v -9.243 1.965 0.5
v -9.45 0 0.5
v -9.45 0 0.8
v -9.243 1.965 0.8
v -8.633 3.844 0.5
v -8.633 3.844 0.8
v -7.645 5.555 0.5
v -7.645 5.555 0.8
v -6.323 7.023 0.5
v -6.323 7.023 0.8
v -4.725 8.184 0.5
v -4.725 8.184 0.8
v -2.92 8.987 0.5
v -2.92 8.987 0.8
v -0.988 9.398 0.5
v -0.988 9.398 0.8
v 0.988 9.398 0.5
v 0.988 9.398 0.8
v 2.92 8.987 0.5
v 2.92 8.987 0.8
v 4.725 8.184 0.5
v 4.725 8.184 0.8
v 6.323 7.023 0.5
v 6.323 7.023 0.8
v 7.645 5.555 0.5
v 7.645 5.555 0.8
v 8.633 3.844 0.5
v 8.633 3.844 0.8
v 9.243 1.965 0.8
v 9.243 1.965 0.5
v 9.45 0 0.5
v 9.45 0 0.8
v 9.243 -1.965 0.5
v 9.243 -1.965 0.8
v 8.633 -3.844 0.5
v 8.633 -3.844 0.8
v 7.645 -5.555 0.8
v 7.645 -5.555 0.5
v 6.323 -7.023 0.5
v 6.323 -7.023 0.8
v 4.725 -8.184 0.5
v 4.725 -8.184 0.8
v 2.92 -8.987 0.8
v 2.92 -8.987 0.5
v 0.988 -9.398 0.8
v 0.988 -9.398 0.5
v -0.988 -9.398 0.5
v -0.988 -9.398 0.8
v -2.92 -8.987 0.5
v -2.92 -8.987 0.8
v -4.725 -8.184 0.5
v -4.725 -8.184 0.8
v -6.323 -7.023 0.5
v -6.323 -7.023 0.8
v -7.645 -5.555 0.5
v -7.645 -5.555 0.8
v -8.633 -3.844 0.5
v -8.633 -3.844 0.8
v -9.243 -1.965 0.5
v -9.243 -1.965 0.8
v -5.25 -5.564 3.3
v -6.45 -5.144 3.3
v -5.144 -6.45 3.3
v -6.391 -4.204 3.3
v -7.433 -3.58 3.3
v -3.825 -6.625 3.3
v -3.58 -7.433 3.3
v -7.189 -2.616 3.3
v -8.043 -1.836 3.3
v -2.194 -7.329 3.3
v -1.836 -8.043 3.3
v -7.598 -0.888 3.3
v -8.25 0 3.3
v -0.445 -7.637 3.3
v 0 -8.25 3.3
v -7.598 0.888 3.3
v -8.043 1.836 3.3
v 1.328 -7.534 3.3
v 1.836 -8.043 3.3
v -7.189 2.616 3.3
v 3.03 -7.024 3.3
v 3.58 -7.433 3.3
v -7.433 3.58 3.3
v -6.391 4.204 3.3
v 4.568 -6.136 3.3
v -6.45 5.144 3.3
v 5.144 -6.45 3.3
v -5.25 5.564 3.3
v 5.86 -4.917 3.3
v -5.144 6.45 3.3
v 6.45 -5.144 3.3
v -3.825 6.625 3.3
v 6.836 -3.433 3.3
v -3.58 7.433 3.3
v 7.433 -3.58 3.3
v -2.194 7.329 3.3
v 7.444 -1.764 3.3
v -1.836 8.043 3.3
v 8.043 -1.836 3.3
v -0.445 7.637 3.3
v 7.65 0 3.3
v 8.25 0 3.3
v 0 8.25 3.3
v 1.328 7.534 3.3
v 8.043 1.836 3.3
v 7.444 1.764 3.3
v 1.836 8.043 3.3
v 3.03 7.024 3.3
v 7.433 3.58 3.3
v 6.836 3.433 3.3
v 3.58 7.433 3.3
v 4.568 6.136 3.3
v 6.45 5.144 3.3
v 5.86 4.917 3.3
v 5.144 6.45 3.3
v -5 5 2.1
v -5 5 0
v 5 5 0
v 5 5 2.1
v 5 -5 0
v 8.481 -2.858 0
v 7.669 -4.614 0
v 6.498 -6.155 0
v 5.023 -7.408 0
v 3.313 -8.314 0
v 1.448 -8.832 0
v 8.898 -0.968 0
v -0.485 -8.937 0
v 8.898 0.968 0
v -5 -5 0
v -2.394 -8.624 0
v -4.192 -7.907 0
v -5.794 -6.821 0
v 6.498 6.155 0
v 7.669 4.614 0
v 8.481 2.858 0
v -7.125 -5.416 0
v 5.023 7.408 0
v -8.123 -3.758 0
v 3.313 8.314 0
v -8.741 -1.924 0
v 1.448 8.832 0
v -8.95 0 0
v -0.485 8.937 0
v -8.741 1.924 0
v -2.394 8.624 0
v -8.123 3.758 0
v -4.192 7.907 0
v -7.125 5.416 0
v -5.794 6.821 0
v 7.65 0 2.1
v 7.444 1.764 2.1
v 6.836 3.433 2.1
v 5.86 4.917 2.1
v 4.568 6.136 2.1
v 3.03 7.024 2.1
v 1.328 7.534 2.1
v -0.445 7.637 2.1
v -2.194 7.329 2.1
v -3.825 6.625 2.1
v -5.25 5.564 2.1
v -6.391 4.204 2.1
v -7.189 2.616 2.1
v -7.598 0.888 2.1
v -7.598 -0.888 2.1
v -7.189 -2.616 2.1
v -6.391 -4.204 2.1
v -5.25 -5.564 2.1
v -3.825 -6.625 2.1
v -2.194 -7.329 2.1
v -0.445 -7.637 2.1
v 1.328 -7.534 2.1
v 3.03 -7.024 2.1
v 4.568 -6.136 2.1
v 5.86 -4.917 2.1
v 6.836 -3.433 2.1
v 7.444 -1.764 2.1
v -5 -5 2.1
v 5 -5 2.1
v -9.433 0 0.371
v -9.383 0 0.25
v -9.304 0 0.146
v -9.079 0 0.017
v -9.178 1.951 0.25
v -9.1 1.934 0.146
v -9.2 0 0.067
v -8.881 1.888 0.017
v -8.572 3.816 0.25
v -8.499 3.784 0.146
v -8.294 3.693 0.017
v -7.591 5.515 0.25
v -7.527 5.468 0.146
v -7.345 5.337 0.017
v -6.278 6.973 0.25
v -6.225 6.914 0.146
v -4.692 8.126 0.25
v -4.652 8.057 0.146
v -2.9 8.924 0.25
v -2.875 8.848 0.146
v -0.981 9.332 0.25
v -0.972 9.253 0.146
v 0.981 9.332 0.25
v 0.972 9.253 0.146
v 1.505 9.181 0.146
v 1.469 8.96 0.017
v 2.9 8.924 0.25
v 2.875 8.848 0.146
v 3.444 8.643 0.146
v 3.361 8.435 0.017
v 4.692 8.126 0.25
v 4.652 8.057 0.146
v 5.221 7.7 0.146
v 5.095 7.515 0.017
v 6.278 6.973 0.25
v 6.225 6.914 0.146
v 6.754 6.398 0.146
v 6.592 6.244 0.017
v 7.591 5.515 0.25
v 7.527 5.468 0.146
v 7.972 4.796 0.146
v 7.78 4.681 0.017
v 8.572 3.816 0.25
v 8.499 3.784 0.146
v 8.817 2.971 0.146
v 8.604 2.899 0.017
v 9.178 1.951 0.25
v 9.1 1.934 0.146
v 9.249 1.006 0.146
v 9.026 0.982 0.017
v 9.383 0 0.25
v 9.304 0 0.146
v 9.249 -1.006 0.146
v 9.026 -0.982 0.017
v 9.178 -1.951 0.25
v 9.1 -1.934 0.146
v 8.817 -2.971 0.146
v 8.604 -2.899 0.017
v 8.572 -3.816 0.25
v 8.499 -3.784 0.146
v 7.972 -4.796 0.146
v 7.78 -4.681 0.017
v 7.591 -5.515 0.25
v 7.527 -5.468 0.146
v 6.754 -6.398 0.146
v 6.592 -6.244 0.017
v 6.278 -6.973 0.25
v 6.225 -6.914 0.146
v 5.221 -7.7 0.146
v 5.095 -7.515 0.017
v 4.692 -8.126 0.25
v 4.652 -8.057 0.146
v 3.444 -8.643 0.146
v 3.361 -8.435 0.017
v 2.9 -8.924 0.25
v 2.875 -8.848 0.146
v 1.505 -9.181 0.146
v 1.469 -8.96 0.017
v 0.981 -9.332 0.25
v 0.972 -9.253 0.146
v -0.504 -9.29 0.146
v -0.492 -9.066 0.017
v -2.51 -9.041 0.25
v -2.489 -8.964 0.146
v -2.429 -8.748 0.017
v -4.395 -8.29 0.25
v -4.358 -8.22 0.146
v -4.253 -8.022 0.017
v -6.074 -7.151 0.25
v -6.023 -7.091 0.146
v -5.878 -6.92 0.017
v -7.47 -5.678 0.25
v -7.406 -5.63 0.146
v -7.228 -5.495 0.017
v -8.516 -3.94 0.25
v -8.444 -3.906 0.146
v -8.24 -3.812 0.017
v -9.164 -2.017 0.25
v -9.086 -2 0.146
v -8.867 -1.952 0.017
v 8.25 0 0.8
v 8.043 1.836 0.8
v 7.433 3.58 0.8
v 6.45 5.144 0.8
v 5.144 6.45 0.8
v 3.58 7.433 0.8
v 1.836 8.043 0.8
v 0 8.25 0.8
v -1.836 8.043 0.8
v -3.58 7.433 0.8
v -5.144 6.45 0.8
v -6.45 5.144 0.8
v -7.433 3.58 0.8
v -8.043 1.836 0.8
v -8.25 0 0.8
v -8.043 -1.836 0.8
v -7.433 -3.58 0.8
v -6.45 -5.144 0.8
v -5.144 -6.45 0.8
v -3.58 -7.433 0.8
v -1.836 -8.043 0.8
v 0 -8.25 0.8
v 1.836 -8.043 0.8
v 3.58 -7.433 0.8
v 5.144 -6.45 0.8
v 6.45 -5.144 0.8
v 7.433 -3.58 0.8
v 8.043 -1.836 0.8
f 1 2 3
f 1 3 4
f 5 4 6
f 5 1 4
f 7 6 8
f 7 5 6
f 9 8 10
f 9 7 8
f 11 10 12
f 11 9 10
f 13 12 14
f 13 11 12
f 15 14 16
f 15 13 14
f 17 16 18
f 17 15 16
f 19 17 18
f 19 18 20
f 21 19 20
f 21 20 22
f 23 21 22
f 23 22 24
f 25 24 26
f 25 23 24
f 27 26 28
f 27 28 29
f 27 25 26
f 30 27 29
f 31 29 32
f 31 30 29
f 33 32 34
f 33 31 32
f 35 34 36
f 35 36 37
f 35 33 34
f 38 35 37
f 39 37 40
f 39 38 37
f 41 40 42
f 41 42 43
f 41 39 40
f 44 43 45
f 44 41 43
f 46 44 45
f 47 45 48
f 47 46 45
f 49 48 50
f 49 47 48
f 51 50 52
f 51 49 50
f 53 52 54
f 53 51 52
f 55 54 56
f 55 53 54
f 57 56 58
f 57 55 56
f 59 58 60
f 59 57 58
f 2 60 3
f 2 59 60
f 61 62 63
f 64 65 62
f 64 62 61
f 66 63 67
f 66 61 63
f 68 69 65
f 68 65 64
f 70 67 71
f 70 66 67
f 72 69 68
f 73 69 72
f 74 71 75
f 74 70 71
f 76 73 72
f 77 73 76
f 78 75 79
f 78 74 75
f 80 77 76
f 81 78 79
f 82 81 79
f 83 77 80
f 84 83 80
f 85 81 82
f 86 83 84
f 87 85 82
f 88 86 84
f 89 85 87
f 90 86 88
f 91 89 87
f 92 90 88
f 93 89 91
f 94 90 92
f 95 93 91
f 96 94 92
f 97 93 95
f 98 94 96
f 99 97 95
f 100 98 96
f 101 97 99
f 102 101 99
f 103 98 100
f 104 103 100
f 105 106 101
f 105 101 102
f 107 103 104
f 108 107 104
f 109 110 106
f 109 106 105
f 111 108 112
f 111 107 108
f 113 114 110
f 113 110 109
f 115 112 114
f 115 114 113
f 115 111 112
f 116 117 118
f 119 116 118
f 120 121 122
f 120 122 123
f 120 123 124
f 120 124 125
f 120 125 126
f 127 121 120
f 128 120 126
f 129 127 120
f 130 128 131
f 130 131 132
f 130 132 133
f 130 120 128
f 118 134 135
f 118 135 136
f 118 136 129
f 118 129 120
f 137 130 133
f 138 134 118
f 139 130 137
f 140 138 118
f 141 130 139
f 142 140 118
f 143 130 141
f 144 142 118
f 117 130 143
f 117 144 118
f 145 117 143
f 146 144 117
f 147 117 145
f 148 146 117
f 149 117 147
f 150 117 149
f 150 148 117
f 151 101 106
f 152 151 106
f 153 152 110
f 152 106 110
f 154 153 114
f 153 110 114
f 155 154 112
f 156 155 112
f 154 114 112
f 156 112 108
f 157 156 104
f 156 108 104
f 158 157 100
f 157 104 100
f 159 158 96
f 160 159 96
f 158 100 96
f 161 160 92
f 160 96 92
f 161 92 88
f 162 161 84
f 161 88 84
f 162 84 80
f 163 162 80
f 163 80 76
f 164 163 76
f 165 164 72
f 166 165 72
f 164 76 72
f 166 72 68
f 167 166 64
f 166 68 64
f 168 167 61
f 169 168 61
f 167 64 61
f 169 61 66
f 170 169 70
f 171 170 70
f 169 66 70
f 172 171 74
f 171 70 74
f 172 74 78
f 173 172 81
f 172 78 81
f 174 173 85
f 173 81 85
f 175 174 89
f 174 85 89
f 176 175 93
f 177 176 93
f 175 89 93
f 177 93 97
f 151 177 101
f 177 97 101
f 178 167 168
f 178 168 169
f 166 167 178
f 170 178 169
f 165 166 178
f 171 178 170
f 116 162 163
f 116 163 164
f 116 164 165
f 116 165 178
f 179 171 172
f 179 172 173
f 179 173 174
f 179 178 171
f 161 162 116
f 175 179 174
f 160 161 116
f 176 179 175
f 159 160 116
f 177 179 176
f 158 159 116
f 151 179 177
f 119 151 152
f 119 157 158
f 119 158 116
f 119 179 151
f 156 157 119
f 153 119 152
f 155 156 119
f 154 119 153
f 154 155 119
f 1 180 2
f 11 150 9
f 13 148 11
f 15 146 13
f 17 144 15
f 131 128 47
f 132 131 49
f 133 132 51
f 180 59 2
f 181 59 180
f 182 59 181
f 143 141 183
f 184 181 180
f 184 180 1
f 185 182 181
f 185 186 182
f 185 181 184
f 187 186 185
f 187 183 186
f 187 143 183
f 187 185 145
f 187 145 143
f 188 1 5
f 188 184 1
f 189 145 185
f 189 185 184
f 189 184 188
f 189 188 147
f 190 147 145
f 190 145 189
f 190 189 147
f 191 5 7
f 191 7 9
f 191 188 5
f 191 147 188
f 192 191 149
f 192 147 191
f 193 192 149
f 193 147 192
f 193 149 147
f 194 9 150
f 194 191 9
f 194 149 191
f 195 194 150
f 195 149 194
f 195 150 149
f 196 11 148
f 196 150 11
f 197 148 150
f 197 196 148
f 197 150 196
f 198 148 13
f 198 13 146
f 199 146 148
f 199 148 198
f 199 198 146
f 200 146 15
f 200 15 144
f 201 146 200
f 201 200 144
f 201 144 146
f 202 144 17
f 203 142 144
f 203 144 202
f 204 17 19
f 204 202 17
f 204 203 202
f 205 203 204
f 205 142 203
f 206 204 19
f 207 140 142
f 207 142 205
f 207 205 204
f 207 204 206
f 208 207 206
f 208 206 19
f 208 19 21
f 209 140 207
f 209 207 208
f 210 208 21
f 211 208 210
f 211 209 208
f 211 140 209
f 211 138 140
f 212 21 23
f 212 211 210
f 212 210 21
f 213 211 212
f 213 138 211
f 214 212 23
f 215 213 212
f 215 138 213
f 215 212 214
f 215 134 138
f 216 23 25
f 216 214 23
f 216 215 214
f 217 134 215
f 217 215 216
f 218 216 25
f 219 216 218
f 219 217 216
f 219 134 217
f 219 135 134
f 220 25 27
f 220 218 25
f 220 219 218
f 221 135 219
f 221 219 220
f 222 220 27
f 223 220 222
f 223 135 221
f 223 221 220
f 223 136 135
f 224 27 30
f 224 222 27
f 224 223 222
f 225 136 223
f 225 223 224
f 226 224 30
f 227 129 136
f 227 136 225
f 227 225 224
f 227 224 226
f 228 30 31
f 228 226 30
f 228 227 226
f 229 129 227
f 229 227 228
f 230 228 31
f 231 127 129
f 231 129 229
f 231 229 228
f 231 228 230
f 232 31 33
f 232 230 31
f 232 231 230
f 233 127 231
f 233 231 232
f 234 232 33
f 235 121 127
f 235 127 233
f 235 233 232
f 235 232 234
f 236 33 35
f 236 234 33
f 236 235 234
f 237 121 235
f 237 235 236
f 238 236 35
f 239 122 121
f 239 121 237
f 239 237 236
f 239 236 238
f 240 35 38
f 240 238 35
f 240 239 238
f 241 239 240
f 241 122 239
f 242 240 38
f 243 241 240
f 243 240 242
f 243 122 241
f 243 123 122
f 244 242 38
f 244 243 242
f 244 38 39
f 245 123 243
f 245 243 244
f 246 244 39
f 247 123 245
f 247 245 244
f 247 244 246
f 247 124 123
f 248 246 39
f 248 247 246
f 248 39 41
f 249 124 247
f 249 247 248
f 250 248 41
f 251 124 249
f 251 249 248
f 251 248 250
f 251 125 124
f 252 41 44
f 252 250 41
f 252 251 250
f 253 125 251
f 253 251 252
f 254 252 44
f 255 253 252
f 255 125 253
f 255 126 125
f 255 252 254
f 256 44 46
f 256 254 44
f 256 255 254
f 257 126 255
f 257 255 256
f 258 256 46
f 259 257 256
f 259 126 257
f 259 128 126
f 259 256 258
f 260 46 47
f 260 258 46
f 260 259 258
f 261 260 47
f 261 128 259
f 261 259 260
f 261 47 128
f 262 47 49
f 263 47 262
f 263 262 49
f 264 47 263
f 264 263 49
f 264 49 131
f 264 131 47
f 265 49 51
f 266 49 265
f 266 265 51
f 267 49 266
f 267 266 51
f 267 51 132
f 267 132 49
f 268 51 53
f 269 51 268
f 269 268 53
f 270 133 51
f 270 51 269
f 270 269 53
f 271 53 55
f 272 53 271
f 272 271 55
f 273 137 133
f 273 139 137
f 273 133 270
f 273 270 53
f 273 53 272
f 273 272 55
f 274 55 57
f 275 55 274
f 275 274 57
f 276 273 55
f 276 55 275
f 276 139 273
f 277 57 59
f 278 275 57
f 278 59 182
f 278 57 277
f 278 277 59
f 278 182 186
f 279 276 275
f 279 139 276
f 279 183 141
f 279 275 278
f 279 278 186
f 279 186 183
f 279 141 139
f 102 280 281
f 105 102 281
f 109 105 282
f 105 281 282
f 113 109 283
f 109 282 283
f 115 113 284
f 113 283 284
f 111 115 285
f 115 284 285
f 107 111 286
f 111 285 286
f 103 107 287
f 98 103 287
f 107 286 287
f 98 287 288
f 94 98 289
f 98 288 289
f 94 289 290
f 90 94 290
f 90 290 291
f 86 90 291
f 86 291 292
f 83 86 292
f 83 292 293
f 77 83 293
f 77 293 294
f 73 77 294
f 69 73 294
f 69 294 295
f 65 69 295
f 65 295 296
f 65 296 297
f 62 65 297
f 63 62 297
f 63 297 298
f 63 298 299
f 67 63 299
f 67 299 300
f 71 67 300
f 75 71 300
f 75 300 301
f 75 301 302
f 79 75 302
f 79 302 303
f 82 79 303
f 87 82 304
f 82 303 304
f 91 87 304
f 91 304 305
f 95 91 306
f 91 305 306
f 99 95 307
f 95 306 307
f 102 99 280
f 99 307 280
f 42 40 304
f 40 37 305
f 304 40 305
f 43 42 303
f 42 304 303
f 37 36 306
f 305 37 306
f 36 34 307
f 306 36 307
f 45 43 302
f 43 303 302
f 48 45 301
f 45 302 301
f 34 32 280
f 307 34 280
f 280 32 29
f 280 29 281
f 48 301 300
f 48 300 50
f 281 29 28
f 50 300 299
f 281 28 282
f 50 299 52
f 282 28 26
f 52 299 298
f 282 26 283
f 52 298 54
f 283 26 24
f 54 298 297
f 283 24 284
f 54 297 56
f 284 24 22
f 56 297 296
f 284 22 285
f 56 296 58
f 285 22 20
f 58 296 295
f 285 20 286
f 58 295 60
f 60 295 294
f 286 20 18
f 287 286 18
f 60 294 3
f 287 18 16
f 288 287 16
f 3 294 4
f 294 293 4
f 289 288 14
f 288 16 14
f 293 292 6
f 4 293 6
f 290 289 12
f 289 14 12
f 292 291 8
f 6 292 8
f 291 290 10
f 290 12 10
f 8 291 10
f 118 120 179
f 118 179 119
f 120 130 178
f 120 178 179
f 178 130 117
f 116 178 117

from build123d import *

# Parameters (mm, degrees)
SKETCH2_R           = 8.25
SKETCH2_W           = 10
SKETCH2_H           = 10
BOSS_EXTRUDE1_DEPTH = 3.3
SKETCH3_R           = 9.45
SKETCH3_W           = 10
SKETCH3_H           = 10
BOSS_EXTRUDE2_DEPTH = 0.8
SKETCH4_R           = 7.65
CUT_EXTRUDE1_DEPTH  = 1.2
FILLET1_R           = 0.5


with BuildPart() as part:
    # Sketch2 → Boss-Extrude1 (new body)
    with BuildSketch(Plane.XY):
        Circle(SKETCH2_R)
        Rectangle(SKETCH2_W, SKETCH2_H, mode=Mode.SUBTRACT)
    extrude(amount=BOSS_EXTRUDE1_DEPTH)

    # Sketch3 → Boss-Extrude2 (add)
    with BuildSketch(Plane(origin=(0, 0, 0), x_dir=(-1, 0, 0), z_dir=(0, 0, -1))):
        Circle(SKETCH3_R)
        Rectangle(SKETCH3_W, SKETCH3_H, mode=Mode.SUBTRACT)
    extrude(amount=-BOSS_EXTRUDE2_DEPTH)

    # Sketch4 → Cut-Extrude1 (cut)
    with BuildSketch(Plane.XY.offset(3.3)):
        Circle(SKETCH4_R)
    extrude(amount=-CUT_EXTRUDE1_DEPTH, mode=Mode.SUBTRACT)

    # Fillet1
    fillet1_edges = [part.edges().sort_by_distance(p)[0] for p in [
        (9.45, 0, 0),
    ]]
    fillet(fillet1_edges, radius=FILLET1_R)


solid = part.part
